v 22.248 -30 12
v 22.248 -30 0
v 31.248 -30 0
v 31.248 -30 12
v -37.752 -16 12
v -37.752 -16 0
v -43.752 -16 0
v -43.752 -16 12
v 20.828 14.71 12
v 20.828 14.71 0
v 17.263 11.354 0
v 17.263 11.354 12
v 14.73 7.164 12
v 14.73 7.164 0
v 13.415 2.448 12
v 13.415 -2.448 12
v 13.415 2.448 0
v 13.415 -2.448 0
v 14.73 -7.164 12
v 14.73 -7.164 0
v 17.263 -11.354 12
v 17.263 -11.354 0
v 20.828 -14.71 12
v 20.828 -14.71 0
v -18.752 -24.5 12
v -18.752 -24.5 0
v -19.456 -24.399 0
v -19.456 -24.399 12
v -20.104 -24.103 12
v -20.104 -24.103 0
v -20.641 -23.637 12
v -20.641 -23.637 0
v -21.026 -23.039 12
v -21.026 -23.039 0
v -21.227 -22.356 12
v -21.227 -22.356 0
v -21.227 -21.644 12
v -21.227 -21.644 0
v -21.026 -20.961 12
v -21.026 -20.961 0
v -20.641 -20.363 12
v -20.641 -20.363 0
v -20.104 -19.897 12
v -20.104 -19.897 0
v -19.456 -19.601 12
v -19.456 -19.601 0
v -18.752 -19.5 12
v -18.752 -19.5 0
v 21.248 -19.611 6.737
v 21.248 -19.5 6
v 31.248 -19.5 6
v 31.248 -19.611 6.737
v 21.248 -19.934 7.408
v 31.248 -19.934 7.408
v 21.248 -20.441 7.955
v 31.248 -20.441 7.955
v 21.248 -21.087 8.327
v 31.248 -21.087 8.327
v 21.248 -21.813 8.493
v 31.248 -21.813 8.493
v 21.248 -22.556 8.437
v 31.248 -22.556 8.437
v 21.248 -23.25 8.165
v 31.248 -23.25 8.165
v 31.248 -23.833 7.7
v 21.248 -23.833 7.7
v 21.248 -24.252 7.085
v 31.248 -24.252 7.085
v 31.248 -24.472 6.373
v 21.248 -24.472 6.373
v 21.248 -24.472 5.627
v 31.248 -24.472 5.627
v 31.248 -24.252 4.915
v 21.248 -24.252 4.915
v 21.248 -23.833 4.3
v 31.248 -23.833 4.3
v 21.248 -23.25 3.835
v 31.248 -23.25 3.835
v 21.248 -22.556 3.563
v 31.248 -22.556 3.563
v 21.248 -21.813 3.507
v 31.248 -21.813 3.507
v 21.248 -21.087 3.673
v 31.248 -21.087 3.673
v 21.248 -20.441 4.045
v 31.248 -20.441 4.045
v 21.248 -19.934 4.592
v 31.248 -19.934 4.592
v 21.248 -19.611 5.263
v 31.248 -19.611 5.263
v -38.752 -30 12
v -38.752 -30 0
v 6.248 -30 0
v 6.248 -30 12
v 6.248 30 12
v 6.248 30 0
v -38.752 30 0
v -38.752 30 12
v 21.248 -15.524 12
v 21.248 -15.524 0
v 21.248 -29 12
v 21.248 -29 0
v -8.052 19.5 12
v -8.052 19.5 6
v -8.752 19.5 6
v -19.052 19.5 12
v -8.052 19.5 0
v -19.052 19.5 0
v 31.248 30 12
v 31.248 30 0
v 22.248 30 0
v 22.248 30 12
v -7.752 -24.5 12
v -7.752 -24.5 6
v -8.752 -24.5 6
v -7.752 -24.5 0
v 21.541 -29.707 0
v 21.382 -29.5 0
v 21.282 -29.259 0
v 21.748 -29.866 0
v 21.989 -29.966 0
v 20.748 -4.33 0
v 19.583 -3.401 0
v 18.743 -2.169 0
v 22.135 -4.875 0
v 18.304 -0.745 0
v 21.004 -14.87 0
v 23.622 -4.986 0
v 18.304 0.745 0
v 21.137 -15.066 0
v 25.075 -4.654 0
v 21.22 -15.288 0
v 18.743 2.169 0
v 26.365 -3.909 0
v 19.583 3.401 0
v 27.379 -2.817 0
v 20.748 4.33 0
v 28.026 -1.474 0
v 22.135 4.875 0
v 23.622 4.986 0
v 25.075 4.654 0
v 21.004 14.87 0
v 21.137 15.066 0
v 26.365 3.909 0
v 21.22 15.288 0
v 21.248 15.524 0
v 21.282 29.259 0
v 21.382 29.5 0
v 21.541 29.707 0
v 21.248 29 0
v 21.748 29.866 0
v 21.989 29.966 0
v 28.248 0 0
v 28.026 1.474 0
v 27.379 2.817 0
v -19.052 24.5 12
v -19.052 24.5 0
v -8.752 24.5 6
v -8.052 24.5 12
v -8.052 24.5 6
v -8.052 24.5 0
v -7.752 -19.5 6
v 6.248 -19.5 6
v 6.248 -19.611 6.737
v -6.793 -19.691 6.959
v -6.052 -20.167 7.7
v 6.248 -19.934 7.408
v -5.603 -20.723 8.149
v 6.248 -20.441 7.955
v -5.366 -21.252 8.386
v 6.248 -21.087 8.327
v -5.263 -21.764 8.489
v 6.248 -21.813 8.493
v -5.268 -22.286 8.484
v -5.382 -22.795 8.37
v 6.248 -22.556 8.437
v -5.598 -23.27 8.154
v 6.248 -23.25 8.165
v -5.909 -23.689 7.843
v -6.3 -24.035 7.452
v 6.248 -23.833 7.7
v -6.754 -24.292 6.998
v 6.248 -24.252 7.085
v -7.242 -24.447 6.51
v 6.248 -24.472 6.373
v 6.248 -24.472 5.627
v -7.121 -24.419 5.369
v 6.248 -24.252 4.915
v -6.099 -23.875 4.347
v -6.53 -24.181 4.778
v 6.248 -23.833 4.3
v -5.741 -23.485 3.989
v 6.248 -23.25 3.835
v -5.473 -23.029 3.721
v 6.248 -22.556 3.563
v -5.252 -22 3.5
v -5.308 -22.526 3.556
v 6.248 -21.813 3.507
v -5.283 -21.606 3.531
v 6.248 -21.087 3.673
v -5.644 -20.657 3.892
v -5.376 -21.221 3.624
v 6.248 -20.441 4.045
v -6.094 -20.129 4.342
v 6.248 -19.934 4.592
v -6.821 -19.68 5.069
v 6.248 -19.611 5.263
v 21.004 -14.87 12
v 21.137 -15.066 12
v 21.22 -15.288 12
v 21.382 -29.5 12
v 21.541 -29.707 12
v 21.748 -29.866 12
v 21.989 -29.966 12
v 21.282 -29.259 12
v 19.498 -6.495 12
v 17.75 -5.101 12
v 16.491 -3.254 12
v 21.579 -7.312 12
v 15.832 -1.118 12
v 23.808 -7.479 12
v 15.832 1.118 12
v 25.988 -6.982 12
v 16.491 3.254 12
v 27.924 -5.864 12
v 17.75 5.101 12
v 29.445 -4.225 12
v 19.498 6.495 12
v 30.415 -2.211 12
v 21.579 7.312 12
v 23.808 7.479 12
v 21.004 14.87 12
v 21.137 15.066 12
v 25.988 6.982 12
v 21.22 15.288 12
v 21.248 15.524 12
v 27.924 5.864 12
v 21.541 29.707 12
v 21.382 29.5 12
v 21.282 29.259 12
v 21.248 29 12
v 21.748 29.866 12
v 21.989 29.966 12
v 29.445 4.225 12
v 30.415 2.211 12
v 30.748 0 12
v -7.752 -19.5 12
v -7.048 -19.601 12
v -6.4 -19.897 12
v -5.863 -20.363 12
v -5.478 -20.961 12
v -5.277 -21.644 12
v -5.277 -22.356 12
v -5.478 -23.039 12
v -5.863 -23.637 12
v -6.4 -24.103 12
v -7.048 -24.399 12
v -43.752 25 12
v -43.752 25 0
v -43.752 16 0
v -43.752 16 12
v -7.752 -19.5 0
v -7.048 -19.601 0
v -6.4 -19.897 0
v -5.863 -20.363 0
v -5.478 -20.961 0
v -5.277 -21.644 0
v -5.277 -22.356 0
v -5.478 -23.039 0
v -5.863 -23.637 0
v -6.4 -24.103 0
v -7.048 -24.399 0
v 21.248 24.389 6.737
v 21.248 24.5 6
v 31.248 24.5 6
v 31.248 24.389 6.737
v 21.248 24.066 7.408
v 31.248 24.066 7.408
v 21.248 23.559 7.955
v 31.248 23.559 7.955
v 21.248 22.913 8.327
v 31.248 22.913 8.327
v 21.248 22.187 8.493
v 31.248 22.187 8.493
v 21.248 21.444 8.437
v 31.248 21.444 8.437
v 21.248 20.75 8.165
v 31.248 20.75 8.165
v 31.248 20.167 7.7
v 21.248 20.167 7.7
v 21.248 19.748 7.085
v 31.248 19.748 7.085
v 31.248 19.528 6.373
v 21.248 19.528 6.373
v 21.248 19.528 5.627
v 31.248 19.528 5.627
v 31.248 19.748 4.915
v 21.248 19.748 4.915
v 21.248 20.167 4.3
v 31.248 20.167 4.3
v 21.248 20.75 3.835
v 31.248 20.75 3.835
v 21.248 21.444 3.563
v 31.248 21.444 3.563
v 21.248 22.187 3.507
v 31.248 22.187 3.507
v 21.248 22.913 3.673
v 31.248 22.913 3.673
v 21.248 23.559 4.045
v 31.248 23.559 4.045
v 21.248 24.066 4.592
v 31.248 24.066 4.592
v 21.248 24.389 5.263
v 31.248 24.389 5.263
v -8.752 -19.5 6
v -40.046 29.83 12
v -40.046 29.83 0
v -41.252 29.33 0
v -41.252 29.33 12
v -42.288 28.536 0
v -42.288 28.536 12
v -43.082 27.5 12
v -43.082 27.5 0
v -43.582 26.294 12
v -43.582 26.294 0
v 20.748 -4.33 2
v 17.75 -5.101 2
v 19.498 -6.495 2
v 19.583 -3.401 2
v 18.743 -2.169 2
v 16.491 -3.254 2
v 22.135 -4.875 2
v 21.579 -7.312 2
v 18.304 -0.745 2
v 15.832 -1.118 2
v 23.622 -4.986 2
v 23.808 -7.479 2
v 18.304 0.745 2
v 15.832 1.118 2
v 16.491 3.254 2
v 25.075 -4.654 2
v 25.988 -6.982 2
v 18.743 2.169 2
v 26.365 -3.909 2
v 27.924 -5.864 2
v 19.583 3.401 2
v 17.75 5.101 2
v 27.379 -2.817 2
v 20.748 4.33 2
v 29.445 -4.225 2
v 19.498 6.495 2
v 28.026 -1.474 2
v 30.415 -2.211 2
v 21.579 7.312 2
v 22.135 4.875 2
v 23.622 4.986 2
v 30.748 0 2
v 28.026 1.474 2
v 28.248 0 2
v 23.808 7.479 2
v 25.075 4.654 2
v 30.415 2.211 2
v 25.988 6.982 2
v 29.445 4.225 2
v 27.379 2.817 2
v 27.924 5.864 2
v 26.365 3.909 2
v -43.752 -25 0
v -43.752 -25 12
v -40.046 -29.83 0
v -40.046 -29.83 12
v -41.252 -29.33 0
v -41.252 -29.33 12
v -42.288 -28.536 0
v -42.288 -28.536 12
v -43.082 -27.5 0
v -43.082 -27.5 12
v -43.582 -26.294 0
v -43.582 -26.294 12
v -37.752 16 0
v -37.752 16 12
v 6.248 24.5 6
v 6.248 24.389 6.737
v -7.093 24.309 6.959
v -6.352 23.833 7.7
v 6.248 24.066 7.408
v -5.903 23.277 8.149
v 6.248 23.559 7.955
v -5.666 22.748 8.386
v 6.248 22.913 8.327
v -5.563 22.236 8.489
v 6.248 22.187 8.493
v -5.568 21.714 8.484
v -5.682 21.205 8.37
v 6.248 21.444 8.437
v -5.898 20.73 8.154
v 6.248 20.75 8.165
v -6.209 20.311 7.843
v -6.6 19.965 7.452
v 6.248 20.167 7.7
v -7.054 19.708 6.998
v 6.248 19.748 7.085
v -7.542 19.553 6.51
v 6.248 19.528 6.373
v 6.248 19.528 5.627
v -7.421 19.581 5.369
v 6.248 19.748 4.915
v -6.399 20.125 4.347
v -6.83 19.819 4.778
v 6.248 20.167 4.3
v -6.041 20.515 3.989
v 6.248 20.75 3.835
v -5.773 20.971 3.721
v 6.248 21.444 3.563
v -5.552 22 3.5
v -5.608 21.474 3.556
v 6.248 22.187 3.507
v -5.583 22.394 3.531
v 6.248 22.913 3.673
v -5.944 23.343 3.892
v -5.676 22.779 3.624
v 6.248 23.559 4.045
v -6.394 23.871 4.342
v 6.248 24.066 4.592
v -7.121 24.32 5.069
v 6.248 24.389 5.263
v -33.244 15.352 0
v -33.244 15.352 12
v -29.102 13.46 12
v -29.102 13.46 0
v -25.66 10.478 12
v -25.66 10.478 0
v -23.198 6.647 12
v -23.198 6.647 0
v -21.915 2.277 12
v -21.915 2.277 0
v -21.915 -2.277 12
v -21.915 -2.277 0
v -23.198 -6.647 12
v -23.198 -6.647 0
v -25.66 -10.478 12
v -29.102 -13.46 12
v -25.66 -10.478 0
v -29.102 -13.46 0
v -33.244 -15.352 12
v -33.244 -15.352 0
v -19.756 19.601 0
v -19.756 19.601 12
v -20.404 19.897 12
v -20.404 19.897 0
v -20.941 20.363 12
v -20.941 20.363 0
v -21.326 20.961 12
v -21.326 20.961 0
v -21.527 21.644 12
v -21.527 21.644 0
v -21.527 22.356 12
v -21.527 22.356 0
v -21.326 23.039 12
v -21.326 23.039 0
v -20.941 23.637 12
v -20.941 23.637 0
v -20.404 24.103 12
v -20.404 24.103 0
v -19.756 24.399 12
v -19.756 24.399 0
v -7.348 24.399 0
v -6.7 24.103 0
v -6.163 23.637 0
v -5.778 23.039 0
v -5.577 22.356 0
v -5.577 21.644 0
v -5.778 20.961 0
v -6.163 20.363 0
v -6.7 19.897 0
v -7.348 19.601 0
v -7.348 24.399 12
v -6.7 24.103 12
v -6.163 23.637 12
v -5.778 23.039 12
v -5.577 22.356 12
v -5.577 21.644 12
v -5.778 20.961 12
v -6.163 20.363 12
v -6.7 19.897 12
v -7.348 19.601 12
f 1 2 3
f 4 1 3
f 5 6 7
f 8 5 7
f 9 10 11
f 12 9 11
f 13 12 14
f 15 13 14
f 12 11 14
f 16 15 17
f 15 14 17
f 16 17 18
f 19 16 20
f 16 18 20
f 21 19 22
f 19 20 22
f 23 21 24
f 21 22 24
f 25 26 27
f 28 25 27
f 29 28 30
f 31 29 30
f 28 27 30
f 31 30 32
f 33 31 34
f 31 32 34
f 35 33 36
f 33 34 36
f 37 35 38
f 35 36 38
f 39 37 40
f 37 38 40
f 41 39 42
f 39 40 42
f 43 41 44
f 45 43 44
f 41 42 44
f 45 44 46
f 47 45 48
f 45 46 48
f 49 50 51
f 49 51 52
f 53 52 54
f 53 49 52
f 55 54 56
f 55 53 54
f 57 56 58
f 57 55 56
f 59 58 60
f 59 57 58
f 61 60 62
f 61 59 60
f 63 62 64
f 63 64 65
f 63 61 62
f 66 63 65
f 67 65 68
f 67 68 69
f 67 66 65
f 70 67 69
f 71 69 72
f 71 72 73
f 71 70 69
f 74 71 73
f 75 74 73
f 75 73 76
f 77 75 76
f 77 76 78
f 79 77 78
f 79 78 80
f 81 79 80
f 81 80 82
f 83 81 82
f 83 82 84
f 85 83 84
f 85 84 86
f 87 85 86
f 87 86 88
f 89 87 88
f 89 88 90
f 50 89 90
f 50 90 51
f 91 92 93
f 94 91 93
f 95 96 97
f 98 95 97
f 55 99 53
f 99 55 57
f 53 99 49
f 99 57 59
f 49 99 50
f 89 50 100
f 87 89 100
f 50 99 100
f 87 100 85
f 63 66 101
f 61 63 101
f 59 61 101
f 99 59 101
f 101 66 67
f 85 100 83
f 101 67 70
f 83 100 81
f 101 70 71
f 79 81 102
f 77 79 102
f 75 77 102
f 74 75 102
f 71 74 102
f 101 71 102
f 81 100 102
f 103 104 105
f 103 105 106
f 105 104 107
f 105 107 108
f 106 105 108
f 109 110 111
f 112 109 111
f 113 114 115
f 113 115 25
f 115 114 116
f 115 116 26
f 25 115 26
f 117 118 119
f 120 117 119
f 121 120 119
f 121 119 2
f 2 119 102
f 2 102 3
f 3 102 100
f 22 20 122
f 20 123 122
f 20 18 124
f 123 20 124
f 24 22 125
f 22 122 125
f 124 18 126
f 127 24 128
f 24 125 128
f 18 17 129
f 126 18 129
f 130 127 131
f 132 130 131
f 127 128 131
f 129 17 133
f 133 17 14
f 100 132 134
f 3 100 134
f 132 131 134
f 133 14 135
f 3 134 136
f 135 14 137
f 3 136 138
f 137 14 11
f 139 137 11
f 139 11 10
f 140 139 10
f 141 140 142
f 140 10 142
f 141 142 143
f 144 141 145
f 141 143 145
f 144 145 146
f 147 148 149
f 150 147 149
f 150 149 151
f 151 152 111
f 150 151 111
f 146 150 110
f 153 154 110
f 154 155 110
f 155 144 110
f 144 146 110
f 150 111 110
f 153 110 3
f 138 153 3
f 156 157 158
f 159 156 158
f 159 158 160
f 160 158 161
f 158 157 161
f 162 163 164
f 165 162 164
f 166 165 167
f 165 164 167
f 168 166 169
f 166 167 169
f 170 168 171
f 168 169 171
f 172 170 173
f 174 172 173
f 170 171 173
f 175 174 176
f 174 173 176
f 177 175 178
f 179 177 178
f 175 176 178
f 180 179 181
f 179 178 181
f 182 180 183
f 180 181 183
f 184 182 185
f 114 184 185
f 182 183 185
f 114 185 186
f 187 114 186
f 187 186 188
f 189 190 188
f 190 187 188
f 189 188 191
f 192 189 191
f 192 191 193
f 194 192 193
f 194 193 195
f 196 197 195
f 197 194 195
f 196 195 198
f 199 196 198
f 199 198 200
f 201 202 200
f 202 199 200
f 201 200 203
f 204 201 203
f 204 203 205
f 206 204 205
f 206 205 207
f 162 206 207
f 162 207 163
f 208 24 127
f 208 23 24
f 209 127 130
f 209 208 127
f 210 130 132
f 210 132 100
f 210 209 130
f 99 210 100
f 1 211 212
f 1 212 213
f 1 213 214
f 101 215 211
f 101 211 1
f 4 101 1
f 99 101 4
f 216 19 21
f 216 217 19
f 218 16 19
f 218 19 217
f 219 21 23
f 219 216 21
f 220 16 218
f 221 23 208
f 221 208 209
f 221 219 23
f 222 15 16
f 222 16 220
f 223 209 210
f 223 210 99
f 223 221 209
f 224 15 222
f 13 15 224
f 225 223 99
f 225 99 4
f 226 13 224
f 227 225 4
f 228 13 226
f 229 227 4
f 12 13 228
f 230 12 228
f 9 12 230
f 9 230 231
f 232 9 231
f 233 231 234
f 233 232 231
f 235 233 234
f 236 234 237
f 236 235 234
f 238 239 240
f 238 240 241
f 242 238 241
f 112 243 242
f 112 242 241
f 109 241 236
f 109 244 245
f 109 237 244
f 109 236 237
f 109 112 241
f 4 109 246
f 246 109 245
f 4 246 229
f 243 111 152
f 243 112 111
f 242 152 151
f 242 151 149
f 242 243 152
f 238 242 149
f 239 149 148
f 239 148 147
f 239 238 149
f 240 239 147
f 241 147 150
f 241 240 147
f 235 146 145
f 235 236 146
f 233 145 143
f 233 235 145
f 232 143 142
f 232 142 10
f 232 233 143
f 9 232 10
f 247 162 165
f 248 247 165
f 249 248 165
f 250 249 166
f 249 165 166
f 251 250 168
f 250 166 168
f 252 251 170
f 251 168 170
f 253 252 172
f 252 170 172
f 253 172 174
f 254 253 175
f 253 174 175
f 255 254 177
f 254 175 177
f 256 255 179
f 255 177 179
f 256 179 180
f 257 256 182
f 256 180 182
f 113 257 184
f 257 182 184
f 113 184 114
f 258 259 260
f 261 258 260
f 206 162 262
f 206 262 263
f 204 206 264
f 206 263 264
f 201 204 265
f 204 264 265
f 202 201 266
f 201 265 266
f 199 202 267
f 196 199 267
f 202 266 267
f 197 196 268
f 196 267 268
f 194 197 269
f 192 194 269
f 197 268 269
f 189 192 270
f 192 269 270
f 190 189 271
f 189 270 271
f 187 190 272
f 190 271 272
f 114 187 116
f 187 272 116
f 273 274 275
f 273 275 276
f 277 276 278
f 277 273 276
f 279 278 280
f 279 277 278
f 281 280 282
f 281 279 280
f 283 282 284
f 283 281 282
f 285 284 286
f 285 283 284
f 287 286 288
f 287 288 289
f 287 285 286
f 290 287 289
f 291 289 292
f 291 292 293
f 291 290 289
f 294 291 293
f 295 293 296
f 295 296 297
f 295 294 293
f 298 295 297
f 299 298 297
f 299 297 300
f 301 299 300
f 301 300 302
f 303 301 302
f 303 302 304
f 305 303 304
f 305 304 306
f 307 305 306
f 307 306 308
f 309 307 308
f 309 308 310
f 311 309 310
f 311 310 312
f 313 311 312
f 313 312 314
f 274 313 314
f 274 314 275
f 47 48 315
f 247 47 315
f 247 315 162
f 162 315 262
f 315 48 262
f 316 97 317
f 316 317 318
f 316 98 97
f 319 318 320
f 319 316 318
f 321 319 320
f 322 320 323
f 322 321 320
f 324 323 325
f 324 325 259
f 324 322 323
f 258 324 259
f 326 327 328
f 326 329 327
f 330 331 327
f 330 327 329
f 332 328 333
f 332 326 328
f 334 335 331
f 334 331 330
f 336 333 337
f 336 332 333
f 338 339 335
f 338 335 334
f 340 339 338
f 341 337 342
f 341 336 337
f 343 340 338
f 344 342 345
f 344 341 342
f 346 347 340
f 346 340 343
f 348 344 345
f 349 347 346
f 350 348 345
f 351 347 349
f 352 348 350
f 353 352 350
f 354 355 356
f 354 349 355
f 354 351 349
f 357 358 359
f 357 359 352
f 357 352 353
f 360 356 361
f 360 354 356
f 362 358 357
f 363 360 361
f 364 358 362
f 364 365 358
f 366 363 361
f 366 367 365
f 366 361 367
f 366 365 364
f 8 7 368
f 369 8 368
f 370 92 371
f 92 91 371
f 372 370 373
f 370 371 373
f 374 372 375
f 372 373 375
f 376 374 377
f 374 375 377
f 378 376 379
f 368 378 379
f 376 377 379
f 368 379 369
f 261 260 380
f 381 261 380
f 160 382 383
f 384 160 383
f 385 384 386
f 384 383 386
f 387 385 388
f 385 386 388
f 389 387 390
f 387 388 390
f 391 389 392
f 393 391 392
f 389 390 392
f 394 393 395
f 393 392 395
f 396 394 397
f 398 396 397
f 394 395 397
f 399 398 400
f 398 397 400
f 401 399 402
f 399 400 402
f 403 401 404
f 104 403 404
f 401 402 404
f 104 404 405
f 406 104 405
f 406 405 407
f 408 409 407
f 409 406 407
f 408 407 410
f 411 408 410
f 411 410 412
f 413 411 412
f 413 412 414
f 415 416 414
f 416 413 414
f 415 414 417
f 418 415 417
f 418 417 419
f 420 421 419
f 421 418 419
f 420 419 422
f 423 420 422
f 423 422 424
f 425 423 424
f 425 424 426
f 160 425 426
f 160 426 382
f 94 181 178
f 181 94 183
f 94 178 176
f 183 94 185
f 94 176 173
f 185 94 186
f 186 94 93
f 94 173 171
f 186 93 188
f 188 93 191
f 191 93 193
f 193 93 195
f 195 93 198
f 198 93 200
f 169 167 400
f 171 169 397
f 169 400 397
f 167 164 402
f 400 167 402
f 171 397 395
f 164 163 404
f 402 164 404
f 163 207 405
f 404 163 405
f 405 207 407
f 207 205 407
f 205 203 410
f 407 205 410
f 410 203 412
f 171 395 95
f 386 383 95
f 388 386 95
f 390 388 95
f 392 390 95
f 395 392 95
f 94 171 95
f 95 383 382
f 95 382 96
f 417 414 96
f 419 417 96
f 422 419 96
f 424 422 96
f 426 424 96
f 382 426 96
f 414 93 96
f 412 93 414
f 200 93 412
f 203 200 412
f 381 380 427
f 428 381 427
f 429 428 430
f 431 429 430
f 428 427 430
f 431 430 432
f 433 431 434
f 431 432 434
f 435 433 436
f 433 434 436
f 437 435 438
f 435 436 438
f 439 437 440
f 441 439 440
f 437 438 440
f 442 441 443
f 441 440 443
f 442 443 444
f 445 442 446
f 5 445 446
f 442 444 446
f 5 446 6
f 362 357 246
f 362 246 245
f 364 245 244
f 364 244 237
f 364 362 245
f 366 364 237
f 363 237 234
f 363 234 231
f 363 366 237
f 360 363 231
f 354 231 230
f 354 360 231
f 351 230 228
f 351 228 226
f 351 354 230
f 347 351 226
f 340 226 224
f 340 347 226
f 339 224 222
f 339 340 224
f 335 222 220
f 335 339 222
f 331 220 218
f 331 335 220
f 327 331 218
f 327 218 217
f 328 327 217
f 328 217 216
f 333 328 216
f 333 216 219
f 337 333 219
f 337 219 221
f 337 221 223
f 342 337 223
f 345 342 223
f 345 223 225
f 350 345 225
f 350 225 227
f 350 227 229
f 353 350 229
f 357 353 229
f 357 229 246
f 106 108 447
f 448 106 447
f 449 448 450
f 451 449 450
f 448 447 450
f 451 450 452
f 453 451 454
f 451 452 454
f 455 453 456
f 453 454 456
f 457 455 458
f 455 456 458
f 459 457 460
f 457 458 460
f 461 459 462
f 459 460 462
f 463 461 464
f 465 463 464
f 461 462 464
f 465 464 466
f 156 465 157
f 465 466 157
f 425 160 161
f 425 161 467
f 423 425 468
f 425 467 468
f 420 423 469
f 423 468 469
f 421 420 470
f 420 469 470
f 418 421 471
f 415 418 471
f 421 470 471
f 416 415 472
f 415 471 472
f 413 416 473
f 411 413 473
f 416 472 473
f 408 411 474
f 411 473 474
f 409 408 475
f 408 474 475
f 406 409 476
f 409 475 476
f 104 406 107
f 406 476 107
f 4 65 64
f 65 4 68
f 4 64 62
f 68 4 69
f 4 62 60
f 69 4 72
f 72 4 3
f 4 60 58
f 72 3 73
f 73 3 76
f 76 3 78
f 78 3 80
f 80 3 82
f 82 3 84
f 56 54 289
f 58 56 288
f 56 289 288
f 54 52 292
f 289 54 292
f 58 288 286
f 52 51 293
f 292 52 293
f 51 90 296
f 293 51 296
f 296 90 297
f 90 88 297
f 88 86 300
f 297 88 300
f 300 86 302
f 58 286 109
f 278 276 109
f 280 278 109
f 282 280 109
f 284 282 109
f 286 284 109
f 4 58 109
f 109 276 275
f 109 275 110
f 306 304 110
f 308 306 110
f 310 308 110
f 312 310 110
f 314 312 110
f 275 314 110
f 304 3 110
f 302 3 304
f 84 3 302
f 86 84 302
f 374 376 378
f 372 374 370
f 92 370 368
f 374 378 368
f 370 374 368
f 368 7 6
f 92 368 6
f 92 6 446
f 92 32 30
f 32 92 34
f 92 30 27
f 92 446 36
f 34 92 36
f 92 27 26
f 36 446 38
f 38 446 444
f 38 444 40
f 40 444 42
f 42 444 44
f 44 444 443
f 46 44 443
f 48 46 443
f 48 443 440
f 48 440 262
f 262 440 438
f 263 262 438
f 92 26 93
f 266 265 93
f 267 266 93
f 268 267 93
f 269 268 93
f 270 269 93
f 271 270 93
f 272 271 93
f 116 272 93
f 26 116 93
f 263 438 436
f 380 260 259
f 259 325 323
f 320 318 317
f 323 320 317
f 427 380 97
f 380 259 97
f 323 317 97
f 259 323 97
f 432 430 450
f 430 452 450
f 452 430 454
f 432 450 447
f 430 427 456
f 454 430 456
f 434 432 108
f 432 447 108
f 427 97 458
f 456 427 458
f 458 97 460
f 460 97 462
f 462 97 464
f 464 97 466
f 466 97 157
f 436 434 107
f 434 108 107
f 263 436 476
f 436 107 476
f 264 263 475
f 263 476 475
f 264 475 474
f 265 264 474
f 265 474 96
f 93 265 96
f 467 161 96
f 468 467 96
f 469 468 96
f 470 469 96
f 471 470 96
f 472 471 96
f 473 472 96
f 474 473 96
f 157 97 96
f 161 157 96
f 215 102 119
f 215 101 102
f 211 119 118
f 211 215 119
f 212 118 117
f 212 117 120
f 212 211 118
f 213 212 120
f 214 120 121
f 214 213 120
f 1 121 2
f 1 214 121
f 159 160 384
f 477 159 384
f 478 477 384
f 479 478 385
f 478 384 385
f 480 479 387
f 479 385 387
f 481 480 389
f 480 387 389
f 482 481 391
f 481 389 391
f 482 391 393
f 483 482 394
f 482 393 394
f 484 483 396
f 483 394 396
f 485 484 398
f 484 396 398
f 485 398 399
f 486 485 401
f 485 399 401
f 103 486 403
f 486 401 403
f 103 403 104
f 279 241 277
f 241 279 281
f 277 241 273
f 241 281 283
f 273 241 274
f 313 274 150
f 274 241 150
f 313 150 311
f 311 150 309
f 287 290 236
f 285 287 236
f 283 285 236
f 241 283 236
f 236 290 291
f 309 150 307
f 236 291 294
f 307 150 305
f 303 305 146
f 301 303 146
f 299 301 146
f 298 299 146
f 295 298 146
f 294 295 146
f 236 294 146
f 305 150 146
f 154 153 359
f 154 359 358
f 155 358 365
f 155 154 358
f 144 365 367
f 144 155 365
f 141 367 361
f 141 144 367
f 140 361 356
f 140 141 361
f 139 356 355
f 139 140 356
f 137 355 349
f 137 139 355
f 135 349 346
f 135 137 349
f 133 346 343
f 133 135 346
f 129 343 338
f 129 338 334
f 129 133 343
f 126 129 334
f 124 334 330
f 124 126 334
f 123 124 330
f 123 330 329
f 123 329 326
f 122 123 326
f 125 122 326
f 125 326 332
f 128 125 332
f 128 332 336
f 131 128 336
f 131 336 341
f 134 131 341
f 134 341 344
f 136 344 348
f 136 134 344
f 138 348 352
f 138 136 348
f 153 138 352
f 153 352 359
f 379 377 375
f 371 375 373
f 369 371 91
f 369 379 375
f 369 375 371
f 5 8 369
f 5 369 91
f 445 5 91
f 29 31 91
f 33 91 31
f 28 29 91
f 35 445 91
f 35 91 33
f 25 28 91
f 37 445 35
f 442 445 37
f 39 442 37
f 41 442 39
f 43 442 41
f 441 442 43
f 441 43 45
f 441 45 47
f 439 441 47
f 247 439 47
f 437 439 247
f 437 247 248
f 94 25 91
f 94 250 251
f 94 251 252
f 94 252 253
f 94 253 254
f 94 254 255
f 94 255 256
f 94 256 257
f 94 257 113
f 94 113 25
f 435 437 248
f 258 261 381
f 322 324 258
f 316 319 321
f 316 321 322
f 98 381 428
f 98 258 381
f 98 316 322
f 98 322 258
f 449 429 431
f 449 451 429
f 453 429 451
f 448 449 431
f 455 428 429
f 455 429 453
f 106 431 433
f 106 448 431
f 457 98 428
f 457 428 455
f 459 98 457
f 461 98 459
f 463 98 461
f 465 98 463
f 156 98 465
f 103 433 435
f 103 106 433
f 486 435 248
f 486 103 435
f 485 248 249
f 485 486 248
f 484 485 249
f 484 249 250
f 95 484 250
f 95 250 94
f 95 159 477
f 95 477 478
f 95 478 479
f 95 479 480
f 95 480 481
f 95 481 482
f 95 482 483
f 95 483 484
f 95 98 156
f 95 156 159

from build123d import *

# Parameters (mm, degrees)
F1_DEPTH  = 12
F2_R      = 2.5
F3_DEPTH  = 15
F4_R      = 5
F5_R      = 7.5
F6_DEPTH  = 12
F5_R_2    = 5
F7_DEPTH  = 2
F6_FACE_W = 60
F6_FACE_H = 12
F8_DEPTH  = 25
F9_R      = 1


with BuildPart() as f1:
    # F0 (on Top) → F1 (new body)
    with BuildSketch(Plane.XY):
        with BuildLine():
            Line((6.248017, -30), (6.248017, 0))
            Line((6.248017, 0), (6.248017, 30))
            Line((6.248017, 30), (-43.751983, 30))
            Line((-43.751983, 30), (-43.751983, 16))
            Line((-43.751983, 16), (-37.751983, 16))
            ThreePointArc((-37.751983, 16), (-21.751983, 0), (-37.751983, -16))
            Line((-37.751983, -16), (-43.751983, -16))
            Line((-43.751983, -16), (-43.751983, -30))
            Line((-43.751983, -30), (6.248017, -30))
        make_face()
        with BuildLine():
            ThreePointArc((-7.751983, -19.5), (-5.251983, -22), (-7.751983, -24.5))
            Line((-7.751983, -24.5), (-18.751983, -24.5))
            ThreePointArc((-18.751983, -24.5), (-21.251983, -22), (-18.751983, -19.5))
            Line((-18.751983, -19.5), (-7.751983, -19.5))
        make_face(mode=Mode.SUBTRACT)
        with BuildLine():
            ThreePointArc((-8.051984, 24.5), (-5.551984, 22), (-8.051984, 19.5))
            Line((-8.051984, 19.5), (-19.051984, 19.5))
            ThreePointArc((-19.051984, 19.5), (-21.551984, 22), (-19.051984, 24.5))
            Line((-19.051984, 24.5), (-8.051984, 24.5))
        make_face(mode=Mode.SUBTRACT)
    extrude(amount=F1_DEPTH)

    # F2 (on face) → F3 (cut)
    with BuildSketch(Plane.YZ.offset(6.248017)):
        with Locations((-22, 6)):
            Circle(F2_R)
        with Locations((22, 6)):
            Circle(F2_R)
    extrude(amount=-F3_DEPTH, mode=Mode.SUBTRACT)

    # F4
    f4_edges = [f1.edges().sort_by_distance(p)[0] for p in [
        (-43.751983, 30, 6),
        (-43.751983, -30, 6),
    ]]
    fillet(f4_edges, radius=F4_R)


with BuildPart() as f6:
    # F5 (on Top) → F6 (new body)
    with BuildSketch(Plane.XY):
        with BuildLine():
            Line((31.248017, 30), (21.248017, 30))
            Line((21.248017, 30), (21.248017, 15))
            ThreePointArc((21.248017, 15), (13.248017, 0), (21.248017, -15))
            Line((21.248017, -15), (21.248017, -30))
            Line((21.248017, -30), (31.248017, -30))
            Line((31.248017, -30), (31.248017, -15))
            Line((31.248017, -15), (31.248017, 15))
            Line((31.248017, 15), (31.248017, 30))
        make_face()
        with Locations((23.248017, 0)):
            Circle(F5_R, mode=Mode.SUBTRACT)
    extrude(amount=F6_DEPTH)

    # F5 (on Top) → F7 (join)
    with BuildSketch(Plane.XY):
        with Locations((23.248017, 0)):
            Circle(F5_R)
        with Locations((23.248017, 0)):
            Circle(F5_R_2, mode=Mode.SUBTRACT)
    extrude(amount=F7_DEPTH)

    # F2 (on face) + F6_face (on face) → F8 (cut)
    with BuildSketch(Plane.YZ.offset(6.248017)):
        with Locations((-22, 6)):
            Circle(F2_R)
        with Locations((22, 6)):
            Circle(F2_R)
    with BuildSketch(Plane(origin=(31.248017, 0, 6), x_dir=(0, 1, 0), z_dir=(1, 0, 0))):
        Rectangle(F6_FACE_W, F6_FACE_H)
    extrude(amount=F8_DEPTH, mode=Mode.SUBTRACT)

    # F9
    f9_edges = [f6.edges().sort_by_distance(p)[0] for p in [
        (21.248017, 30, 6),
        (21.248017, 15, 6),
        (21.248017, -15, 6),
        (21.248017, -30, 6),
    ]]
    fillet(f9_edges, radius=F9_R)


solid = Compound([f1.part, f6.part])
